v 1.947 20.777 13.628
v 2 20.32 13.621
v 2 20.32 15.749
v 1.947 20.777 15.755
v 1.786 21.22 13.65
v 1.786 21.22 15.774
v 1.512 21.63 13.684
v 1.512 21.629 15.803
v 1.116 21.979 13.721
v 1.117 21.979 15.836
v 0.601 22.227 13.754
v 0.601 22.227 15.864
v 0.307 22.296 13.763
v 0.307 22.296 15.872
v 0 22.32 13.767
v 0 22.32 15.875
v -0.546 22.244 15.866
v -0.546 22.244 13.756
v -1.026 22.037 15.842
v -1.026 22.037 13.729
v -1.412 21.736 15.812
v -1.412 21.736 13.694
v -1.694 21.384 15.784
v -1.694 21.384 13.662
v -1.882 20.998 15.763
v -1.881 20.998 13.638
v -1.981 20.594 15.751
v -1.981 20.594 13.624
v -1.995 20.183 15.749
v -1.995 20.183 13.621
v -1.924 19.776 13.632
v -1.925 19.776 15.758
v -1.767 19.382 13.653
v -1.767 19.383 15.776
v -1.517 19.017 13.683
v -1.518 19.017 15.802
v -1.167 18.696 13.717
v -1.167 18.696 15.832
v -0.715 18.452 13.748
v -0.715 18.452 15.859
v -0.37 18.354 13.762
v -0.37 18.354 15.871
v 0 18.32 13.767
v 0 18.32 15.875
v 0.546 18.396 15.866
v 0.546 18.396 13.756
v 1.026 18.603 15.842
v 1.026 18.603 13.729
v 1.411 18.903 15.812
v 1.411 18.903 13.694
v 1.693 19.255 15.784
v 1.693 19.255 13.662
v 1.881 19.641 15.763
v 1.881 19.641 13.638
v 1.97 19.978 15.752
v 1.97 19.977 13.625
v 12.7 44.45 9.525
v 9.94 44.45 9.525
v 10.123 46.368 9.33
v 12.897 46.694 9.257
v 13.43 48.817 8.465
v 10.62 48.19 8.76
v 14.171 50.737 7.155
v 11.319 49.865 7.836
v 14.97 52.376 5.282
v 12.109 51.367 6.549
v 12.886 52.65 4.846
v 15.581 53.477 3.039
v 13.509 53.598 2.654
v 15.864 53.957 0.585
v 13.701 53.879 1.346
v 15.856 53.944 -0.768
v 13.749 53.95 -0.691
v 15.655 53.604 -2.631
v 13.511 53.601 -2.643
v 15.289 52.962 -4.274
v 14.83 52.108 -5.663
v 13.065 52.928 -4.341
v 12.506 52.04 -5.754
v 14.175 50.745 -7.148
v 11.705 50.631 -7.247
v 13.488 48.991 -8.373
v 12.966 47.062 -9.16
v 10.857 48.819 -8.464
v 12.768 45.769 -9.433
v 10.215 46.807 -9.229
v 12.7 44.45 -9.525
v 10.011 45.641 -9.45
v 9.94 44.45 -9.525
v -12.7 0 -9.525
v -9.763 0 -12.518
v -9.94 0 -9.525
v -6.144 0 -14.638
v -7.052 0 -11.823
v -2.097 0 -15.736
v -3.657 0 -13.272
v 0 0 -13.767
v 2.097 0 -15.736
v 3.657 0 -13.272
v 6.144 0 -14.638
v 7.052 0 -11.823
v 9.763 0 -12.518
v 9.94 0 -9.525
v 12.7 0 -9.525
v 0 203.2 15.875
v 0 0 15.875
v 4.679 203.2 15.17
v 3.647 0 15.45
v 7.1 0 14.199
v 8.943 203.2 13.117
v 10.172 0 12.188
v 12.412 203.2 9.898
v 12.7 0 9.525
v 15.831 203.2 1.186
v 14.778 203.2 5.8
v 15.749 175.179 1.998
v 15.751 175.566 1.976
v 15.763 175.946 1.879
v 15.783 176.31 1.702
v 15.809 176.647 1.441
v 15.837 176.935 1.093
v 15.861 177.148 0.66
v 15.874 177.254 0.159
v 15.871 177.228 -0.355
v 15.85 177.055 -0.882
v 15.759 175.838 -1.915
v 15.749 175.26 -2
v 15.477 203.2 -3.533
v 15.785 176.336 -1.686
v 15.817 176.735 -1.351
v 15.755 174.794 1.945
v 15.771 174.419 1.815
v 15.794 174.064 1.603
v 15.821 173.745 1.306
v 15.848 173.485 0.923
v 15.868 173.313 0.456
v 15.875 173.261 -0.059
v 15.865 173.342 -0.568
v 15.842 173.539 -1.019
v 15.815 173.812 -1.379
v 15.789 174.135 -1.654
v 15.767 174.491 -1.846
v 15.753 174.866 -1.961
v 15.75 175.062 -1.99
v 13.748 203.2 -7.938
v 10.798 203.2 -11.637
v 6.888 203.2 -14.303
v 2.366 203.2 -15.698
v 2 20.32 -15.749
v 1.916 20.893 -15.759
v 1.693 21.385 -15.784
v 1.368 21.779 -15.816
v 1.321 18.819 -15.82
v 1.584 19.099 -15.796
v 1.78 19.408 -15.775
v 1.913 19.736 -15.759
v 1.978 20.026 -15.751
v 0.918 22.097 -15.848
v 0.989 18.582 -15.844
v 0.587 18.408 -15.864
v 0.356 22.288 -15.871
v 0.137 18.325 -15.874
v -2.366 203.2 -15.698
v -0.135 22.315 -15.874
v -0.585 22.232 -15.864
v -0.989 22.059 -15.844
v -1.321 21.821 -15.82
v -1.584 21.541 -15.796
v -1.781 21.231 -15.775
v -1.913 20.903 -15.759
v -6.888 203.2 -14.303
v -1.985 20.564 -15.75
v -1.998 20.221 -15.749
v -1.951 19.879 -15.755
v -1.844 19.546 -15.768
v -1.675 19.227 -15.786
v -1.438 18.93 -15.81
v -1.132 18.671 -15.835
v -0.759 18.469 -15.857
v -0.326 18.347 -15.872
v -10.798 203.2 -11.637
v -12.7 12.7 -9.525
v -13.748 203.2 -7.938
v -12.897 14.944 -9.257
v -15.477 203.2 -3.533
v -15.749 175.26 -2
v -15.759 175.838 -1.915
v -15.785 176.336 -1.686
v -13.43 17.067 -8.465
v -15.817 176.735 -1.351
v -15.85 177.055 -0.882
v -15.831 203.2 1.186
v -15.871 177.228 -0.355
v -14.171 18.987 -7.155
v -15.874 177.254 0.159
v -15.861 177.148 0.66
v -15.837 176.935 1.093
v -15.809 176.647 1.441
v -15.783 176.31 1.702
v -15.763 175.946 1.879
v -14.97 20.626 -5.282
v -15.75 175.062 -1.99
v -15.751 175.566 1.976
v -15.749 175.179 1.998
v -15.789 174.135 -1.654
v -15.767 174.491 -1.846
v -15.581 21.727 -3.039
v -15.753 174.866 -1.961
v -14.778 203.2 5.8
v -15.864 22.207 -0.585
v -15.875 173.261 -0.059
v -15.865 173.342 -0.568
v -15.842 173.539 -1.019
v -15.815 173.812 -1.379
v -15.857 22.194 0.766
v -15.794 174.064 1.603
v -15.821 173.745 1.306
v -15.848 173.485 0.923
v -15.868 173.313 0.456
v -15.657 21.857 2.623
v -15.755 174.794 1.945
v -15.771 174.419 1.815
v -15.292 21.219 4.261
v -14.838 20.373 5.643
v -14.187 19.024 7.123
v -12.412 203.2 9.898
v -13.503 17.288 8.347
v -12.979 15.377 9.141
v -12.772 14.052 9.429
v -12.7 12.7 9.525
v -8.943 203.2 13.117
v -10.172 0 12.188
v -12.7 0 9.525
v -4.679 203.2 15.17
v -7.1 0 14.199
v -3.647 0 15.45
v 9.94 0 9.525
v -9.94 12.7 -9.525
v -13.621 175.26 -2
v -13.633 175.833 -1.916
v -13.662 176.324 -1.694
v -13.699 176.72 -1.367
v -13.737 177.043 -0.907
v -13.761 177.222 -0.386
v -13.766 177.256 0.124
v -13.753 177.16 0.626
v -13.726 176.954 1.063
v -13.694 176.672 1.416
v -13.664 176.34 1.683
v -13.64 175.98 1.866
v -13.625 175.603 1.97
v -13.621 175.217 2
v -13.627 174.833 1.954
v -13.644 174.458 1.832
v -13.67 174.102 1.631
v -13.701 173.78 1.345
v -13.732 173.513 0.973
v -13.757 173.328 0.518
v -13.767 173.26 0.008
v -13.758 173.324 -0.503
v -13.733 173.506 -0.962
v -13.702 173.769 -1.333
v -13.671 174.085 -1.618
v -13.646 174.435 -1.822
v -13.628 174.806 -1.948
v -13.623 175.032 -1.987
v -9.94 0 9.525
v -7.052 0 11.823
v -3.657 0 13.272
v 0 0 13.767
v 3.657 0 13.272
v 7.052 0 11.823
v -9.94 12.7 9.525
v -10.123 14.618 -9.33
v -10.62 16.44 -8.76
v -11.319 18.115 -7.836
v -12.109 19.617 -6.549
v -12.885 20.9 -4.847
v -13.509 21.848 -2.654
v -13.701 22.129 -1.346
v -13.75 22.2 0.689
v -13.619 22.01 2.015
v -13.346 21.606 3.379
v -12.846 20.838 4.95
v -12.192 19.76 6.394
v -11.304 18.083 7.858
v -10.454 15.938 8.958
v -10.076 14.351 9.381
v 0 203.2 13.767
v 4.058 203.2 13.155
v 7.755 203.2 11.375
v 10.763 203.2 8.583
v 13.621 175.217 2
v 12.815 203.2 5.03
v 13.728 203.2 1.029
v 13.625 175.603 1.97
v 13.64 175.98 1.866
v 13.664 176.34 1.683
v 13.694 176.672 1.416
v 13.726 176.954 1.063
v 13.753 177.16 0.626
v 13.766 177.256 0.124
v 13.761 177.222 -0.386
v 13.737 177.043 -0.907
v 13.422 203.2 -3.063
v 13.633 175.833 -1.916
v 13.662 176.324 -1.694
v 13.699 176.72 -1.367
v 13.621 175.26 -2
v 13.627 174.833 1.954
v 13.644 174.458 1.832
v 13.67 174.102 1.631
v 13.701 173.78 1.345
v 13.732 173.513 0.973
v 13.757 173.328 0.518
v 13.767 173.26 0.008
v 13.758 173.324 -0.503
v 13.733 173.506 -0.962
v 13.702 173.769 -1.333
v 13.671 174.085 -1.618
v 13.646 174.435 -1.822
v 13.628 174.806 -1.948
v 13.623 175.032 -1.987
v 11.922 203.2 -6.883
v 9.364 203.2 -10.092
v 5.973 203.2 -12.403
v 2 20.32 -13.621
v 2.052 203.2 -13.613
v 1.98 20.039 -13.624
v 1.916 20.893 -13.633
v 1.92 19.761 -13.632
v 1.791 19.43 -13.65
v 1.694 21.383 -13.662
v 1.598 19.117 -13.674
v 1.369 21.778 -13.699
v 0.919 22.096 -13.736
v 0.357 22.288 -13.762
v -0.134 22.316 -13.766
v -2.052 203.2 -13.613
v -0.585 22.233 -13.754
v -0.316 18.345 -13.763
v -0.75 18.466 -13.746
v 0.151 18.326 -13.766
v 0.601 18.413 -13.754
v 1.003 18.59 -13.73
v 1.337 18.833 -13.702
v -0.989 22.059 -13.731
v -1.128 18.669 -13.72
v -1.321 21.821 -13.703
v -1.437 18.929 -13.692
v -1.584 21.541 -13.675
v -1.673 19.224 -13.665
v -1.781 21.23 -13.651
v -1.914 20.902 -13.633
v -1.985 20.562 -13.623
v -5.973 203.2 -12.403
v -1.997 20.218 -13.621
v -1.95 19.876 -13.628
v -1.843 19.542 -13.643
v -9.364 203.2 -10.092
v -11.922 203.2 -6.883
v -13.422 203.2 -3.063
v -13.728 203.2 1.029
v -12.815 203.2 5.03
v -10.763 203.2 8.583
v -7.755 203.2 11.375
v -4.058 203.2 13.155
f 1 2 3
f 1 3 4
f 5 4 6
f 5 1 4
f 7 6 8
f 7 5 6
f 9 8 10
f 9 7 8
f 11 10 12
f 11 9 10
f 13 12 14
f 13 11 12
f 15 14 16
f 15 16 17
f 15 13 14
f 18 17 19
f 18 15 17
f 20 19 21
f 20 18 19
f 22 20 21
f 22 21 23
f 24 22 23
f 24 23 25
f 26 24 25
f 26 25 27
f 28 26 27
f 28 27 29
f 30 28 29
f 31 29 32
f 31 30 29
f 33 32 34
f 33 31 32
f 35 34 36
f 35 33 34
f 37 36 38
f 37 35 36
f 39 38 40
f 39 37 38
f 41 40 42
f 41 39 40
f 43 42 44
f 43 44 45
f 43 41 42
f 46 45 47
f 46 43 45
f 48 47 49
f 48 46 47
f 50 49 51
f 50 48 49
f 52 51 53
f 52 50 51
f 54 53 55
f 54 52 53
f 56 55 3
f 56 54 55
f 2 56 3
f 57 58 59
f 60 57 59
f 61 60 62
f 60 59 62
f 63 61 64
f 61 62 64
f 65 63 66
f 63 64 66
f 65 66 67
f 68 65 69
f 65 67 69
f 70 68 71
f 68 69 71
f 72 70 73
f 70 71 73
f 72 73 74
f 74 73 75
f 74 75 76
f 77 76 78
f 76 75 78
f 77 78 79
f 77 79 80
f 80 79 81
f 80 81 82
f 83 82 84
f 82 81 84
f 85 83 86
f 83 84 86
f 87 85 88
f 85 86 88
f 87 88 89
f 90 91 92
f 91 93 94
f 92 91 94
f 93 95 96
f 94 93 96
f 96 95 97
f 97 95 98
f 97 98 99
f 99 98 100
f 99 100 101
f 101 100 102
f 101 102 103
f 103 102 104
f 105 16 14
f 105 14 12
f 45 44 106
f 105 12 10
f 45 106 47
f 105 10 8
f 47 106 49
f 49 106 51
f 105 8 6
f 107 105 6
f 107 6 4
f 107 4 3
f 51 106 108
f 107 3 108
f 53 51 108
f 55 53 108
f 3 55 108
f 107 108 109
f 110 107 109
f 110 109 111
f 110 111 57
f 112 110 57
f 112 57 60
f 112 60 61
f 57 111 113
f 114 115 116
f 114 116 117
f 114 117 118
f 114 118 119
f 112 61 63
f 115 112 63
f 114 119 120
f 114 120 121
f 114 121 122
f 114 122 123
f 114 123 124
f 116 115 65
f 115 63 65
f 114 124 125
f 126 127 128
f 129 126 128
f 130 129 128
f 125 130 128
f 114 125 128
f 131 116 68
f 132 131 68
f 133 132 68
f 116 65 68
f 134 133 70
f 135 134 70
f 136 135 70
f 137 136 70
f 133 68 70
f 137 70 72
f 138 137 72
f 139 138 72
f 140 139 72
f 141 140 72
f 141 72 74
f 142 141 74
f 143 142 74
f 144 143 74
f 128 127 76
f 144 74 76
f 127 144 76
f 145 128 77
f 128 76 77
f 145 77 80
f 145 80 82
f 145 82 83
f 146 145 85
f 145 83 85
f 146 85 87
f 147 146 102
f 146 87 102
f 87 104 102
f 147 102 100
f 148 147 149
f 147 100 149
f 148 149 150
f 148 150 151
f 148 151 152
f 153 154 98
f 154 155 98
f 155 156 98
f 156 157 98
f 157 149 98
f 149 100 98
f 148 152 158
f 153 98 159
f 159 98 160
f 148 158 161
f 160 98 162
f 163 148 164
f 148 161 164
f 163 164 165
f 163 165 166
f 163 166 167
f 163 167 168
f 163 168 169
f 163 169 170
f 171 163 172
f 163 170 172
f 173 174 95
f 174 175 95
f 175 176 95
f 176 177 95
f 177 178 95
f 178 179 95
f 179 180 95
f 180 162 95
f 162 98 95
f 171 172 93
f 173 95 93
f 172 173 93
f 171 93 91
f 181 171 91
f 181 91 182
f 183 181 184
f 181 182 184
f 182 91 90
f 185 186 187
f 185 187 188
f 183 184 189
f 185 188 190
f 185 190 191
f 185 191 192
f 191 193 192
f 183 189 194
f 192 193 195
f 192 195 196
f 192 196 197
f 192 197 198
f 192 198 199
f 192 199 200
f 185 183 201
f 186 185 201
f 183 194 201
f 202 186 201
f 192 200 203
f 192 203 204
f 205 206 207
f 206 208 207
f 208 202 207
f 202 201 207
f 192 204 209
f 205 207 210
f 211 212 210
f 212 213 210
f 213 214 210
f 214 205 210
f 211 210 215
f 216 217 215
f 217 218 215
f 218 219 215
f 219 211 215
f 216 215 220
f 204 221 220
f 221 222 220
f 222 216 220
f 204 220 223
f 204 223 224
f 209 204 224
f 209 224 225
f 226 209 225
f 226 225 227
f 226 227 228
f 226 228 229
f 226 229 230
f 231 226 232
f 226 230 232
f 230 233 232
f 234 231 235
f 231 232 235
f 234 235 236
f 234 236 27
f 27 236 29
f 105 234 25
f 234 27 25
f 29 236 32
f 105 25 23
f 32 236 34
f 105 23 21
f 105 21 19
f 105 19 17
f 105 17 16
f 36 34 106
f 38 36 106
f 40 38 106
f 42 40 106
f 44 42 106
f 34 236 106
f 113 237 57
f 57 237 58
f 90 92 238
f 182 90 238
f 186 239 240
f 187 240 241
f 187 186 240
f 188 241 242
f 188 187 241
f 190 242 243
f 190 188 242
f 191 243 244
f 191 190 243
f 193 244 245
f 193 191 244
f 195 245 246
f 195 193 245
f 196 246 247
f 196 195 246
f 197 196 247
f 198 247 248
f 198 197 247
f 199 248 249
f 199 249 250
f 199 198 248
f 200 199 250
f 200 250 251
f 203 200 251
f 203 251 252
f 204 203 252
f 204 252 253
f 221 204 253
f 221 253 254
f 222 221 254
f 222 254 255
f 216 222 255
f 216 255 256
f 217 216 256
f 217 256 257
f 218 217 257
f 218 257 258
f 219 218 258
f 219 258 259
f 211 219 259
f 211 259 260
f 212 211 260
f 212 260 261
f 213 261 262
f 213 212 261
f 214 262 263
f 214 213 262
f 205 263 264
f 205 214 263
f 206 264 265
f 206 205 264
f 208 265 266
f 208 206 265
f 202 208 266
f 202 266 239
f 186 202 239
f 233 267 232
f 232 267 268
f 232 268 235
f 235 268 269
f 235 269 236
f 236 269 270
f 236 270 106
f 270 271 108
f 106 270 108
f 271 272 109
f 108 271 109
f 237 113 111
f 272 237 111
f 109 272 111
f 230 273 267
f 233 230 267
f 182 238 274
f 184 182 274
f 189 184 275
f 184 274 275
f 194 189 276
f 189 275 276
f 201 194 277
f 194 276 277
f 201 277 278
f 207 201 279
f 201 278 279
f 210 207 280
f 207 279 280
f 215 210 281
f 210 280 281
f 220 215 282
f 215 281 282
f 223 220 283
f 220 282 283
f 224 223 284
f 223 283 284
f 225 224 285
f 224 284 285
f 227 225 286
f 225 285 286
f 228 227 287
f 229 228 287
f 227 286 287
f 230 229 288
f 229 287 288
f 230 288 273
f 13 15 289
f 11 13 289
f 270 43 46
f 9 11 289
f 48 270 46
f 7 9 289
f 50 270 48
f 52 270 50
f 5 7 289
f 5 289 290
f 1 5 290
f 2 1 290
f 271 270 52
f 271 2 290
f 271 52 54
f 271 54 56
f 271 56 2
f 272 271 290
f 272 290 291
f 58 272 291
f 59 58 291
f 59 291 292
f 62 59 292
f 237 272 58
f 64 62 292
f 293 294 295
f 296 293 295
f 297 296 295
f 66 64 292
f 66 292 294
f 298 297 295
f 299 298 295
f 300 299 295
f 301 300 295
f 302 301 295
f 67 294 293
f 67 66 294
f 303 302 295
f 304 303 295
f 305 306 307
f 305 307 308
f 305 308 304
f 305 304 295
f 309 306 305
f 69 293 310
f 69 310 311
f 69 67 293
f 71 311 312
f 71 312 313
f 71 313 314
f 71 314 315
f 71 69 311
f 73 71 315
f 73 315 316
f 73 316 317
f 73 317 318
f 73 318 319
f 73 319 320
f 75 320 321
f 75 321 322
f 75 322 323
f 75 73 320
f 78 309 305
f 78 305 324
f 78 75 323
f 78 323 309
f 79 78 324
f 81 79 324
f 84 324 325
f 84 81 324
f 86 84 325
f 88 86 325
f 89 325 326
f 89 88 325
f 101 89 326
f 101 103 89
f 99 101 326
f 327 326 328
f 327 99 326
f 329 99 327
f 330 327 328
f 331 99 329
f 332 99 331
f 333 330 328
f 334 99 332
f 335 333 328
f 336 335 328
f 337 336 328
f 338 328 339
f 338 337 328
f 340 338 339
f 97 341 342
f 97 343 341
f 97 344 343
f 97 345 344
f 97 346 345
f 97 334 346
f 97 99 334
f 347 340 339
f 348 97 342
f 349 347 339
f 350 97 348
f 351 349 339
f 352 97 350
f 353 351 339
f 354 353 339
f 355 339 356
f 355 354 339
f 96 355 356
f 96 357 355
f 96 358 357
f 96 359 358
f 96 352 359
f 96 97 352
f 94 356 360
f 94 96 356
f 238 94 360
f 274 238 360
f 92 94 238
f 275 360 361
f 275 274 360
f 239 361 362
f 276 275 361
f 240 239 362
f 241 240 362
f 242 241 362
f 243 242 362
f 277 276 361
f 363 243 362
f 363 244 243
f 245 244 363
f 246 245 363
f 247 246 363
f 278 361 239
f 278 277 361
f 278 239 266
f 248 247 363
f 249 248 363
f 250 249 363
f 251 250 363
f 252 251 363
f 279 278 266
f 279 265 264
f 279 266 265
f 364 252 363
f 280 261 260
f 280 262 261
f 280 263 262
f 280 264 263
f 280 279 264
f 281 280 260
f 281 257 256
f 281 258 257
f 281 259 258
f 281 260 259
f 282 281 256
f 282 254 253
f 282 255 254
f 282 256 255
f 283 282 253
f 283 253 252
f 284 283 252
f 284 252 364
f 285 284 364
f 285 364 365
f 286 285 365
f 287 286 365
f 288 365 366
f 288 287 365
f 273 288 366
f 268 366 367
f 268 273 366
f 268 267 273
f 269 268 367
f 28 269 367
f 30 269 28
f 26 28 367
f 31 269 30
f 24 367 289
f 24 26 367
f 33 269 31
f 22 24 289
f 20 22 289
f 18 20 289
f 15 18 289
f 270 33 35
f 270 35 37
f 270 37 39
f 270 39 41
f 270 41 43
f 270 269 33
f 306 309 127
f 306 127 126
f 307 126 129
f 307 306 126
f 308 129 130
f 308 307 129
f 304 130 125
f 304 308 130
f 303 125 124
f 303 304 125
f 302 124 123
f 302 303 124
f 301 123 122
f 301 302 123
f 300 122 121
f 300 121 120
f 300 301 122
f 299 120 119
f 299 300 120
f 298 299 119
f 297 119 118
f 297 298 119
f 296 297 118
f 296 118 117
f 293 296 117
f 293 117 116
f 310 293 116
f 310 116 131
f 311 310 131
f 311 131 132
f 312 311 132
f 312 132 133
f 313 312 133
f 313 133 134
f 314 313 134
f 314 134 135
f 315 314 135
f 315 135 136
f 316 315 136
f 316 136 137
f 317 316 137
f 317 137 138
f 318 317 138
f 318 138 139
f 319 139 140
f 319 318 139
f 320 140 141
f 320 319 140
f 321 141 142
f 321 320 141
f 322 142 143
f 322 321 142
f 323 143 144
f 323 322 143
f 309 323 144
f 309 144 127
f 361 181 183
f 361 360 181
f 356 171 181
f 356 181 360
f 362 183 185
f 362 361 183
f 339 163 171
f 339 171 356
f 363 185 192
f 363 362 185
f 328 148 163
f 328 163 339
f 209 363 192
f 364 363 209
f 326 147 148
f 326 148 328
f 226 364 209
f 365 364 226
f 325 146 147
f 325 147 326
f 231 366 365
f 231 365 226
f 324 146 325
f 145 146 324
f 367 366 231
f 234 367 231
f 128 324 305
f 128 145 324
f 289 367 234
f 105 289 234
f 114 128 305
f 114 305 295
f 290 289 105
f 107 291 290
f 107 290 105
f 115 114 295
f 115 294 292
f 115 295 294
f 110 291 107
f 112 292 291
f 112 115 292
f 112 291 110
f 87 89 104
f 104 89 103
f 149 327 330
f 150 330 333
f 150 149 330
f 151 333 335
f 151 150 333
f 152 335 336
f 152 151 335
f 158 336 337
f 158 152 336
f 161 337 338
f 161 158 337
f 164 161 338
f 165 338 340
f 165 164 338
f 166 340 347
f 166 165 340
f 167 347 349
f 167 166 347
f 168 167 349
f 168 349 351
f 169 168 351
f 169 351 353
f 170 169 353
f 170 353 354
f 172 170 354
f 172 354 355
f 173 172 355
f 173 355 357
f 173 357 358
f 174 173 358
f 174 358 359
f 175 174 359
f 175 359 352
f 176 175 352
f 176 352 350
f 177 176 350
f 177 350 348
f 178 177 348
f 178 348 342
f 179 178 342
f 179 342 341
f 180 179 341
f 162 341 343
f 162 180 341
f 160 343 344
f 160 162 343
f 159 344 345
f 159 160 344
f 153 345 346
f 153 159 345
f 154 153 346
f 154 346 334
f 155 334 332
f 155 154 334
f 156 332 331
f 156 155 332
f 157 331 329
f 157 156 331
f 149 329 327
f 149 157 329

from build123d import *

# Parameters (mm, degrees)
SKETCH1_R               = 15.875
SKETCH1_R_2             = 13.7668
BOSS_EXTRUDE1_DEPTH     = 203.2
CUT_EXTRUDE2_DEPTH      = 205.436472406
CUT_EXTRUDE2_DEPTH_BACK = 205.436472406
SKETCH4_R               = 2
CUT_EXTRUDE3_DEPTH      = 205.436472522
CUT_EXTRUDE3_DEPTH_BACK = 205.436472522
SKETCH3_R               = 2
CUT_EXTRUDE4_DEPTH      = 205.436472522
CUT_EXTRUDE5_DEPTH      = 205.436472522


with BuildPart() as part:
    # Sketch1 → Boss-Extrude1 (new body)
    with BuildSketch(Plane(origin=(0, 0, 0), x_dir=(1, 0, 0), z_dir=(0, 1, 0))):
        with Locations(Location((0, 0, 0), (0, 0, 270))):
            Circle(SKETCH1_R)
        with Locations(Location((0, 0, 0), (0, 0, 270))):
            Circle(SKETCH1_R_2, mode=Mode.SUBTRACT)
    extrude(amount=BOSS_EXTRUDE1_DEPTH)

    # Sketch4 → Cut-Extrude2 (cut, two sides: drawn at the far end of the back side and taken through both)
    with BuildSketch(Plane.XY.offset(-CUT_EXTRUDE2_DEPTH_BACK)):
        with Locations((0, 20.32)):
            Circle(SKETCH4_R)
    extrude(amount=CUT_EXTRUDE2_DEPTH + CUT_EXTRUDE2_DEPTH_BACK, mode=Mode.SUBTRACT)

    # Sketch3 → Cut-Extrude3 (cut, two sides: drawn at the far end of the back side and taken through both)
    with BuildSketch(Plane(origin=(0, 0, 0), x_dir=(0, 0, -1), z_dir=(1, 0, 0)).offset(-CUT_EXTRUDE3_DEPTH_BACK)):
        with Locations((0, 175.26)):
            Circle(SKETCH3_R)
    extrude(amount=CUT_EXTRUDE3_DEPTH + CUT_EXTRUDE3_DEPTH_BACK, mode=Mode.SUBTRACT)

    # Sketch5 → Cut-Extrude4 (cut, through all)
    with BuildSketch(Plane(origin=(0, 0, 0), x_dir=(0, 0, -1), z_dir=(1, 0, 0))):
        with BuildLine():
            Line((9.525, 44.45), (9.525, 0))
            Line((9.525, 0), (-9.525, 0))
            Line((-9.525, 0), (-9.525, 44.45))
            ThreePointArc((-9.525, 44.45), (0, 53.975), (9.525, 44.45))
        make_face()
    extrude(amount=CUT_EXTRUDE4_DEPTH, mode=Mode.SUBTRACT)

    # Sketch6 → Cut-Extrude5 (cut, through all)
    with BuildSketch(Plane(origin=(0, 0, 0), x_dir=(0, 0, -1), z_dir=(1, 0, 0))):
        with BuildLine():
            Line((-9.525, 0), (9.525, 0))
            Line((9.525, 0), (9.525, 12.7))
            ThreePointArc((9.525, 12.7), (0, 22.225), (-9.525, 12.7))
            Line((-9.525, 12.7), (-9.525, 0))
        make_face()
    extrude(amount=-CUT_EXTRUDE5_DEPTH, mode=Mode.SUBTRACT)


solid = part.part
